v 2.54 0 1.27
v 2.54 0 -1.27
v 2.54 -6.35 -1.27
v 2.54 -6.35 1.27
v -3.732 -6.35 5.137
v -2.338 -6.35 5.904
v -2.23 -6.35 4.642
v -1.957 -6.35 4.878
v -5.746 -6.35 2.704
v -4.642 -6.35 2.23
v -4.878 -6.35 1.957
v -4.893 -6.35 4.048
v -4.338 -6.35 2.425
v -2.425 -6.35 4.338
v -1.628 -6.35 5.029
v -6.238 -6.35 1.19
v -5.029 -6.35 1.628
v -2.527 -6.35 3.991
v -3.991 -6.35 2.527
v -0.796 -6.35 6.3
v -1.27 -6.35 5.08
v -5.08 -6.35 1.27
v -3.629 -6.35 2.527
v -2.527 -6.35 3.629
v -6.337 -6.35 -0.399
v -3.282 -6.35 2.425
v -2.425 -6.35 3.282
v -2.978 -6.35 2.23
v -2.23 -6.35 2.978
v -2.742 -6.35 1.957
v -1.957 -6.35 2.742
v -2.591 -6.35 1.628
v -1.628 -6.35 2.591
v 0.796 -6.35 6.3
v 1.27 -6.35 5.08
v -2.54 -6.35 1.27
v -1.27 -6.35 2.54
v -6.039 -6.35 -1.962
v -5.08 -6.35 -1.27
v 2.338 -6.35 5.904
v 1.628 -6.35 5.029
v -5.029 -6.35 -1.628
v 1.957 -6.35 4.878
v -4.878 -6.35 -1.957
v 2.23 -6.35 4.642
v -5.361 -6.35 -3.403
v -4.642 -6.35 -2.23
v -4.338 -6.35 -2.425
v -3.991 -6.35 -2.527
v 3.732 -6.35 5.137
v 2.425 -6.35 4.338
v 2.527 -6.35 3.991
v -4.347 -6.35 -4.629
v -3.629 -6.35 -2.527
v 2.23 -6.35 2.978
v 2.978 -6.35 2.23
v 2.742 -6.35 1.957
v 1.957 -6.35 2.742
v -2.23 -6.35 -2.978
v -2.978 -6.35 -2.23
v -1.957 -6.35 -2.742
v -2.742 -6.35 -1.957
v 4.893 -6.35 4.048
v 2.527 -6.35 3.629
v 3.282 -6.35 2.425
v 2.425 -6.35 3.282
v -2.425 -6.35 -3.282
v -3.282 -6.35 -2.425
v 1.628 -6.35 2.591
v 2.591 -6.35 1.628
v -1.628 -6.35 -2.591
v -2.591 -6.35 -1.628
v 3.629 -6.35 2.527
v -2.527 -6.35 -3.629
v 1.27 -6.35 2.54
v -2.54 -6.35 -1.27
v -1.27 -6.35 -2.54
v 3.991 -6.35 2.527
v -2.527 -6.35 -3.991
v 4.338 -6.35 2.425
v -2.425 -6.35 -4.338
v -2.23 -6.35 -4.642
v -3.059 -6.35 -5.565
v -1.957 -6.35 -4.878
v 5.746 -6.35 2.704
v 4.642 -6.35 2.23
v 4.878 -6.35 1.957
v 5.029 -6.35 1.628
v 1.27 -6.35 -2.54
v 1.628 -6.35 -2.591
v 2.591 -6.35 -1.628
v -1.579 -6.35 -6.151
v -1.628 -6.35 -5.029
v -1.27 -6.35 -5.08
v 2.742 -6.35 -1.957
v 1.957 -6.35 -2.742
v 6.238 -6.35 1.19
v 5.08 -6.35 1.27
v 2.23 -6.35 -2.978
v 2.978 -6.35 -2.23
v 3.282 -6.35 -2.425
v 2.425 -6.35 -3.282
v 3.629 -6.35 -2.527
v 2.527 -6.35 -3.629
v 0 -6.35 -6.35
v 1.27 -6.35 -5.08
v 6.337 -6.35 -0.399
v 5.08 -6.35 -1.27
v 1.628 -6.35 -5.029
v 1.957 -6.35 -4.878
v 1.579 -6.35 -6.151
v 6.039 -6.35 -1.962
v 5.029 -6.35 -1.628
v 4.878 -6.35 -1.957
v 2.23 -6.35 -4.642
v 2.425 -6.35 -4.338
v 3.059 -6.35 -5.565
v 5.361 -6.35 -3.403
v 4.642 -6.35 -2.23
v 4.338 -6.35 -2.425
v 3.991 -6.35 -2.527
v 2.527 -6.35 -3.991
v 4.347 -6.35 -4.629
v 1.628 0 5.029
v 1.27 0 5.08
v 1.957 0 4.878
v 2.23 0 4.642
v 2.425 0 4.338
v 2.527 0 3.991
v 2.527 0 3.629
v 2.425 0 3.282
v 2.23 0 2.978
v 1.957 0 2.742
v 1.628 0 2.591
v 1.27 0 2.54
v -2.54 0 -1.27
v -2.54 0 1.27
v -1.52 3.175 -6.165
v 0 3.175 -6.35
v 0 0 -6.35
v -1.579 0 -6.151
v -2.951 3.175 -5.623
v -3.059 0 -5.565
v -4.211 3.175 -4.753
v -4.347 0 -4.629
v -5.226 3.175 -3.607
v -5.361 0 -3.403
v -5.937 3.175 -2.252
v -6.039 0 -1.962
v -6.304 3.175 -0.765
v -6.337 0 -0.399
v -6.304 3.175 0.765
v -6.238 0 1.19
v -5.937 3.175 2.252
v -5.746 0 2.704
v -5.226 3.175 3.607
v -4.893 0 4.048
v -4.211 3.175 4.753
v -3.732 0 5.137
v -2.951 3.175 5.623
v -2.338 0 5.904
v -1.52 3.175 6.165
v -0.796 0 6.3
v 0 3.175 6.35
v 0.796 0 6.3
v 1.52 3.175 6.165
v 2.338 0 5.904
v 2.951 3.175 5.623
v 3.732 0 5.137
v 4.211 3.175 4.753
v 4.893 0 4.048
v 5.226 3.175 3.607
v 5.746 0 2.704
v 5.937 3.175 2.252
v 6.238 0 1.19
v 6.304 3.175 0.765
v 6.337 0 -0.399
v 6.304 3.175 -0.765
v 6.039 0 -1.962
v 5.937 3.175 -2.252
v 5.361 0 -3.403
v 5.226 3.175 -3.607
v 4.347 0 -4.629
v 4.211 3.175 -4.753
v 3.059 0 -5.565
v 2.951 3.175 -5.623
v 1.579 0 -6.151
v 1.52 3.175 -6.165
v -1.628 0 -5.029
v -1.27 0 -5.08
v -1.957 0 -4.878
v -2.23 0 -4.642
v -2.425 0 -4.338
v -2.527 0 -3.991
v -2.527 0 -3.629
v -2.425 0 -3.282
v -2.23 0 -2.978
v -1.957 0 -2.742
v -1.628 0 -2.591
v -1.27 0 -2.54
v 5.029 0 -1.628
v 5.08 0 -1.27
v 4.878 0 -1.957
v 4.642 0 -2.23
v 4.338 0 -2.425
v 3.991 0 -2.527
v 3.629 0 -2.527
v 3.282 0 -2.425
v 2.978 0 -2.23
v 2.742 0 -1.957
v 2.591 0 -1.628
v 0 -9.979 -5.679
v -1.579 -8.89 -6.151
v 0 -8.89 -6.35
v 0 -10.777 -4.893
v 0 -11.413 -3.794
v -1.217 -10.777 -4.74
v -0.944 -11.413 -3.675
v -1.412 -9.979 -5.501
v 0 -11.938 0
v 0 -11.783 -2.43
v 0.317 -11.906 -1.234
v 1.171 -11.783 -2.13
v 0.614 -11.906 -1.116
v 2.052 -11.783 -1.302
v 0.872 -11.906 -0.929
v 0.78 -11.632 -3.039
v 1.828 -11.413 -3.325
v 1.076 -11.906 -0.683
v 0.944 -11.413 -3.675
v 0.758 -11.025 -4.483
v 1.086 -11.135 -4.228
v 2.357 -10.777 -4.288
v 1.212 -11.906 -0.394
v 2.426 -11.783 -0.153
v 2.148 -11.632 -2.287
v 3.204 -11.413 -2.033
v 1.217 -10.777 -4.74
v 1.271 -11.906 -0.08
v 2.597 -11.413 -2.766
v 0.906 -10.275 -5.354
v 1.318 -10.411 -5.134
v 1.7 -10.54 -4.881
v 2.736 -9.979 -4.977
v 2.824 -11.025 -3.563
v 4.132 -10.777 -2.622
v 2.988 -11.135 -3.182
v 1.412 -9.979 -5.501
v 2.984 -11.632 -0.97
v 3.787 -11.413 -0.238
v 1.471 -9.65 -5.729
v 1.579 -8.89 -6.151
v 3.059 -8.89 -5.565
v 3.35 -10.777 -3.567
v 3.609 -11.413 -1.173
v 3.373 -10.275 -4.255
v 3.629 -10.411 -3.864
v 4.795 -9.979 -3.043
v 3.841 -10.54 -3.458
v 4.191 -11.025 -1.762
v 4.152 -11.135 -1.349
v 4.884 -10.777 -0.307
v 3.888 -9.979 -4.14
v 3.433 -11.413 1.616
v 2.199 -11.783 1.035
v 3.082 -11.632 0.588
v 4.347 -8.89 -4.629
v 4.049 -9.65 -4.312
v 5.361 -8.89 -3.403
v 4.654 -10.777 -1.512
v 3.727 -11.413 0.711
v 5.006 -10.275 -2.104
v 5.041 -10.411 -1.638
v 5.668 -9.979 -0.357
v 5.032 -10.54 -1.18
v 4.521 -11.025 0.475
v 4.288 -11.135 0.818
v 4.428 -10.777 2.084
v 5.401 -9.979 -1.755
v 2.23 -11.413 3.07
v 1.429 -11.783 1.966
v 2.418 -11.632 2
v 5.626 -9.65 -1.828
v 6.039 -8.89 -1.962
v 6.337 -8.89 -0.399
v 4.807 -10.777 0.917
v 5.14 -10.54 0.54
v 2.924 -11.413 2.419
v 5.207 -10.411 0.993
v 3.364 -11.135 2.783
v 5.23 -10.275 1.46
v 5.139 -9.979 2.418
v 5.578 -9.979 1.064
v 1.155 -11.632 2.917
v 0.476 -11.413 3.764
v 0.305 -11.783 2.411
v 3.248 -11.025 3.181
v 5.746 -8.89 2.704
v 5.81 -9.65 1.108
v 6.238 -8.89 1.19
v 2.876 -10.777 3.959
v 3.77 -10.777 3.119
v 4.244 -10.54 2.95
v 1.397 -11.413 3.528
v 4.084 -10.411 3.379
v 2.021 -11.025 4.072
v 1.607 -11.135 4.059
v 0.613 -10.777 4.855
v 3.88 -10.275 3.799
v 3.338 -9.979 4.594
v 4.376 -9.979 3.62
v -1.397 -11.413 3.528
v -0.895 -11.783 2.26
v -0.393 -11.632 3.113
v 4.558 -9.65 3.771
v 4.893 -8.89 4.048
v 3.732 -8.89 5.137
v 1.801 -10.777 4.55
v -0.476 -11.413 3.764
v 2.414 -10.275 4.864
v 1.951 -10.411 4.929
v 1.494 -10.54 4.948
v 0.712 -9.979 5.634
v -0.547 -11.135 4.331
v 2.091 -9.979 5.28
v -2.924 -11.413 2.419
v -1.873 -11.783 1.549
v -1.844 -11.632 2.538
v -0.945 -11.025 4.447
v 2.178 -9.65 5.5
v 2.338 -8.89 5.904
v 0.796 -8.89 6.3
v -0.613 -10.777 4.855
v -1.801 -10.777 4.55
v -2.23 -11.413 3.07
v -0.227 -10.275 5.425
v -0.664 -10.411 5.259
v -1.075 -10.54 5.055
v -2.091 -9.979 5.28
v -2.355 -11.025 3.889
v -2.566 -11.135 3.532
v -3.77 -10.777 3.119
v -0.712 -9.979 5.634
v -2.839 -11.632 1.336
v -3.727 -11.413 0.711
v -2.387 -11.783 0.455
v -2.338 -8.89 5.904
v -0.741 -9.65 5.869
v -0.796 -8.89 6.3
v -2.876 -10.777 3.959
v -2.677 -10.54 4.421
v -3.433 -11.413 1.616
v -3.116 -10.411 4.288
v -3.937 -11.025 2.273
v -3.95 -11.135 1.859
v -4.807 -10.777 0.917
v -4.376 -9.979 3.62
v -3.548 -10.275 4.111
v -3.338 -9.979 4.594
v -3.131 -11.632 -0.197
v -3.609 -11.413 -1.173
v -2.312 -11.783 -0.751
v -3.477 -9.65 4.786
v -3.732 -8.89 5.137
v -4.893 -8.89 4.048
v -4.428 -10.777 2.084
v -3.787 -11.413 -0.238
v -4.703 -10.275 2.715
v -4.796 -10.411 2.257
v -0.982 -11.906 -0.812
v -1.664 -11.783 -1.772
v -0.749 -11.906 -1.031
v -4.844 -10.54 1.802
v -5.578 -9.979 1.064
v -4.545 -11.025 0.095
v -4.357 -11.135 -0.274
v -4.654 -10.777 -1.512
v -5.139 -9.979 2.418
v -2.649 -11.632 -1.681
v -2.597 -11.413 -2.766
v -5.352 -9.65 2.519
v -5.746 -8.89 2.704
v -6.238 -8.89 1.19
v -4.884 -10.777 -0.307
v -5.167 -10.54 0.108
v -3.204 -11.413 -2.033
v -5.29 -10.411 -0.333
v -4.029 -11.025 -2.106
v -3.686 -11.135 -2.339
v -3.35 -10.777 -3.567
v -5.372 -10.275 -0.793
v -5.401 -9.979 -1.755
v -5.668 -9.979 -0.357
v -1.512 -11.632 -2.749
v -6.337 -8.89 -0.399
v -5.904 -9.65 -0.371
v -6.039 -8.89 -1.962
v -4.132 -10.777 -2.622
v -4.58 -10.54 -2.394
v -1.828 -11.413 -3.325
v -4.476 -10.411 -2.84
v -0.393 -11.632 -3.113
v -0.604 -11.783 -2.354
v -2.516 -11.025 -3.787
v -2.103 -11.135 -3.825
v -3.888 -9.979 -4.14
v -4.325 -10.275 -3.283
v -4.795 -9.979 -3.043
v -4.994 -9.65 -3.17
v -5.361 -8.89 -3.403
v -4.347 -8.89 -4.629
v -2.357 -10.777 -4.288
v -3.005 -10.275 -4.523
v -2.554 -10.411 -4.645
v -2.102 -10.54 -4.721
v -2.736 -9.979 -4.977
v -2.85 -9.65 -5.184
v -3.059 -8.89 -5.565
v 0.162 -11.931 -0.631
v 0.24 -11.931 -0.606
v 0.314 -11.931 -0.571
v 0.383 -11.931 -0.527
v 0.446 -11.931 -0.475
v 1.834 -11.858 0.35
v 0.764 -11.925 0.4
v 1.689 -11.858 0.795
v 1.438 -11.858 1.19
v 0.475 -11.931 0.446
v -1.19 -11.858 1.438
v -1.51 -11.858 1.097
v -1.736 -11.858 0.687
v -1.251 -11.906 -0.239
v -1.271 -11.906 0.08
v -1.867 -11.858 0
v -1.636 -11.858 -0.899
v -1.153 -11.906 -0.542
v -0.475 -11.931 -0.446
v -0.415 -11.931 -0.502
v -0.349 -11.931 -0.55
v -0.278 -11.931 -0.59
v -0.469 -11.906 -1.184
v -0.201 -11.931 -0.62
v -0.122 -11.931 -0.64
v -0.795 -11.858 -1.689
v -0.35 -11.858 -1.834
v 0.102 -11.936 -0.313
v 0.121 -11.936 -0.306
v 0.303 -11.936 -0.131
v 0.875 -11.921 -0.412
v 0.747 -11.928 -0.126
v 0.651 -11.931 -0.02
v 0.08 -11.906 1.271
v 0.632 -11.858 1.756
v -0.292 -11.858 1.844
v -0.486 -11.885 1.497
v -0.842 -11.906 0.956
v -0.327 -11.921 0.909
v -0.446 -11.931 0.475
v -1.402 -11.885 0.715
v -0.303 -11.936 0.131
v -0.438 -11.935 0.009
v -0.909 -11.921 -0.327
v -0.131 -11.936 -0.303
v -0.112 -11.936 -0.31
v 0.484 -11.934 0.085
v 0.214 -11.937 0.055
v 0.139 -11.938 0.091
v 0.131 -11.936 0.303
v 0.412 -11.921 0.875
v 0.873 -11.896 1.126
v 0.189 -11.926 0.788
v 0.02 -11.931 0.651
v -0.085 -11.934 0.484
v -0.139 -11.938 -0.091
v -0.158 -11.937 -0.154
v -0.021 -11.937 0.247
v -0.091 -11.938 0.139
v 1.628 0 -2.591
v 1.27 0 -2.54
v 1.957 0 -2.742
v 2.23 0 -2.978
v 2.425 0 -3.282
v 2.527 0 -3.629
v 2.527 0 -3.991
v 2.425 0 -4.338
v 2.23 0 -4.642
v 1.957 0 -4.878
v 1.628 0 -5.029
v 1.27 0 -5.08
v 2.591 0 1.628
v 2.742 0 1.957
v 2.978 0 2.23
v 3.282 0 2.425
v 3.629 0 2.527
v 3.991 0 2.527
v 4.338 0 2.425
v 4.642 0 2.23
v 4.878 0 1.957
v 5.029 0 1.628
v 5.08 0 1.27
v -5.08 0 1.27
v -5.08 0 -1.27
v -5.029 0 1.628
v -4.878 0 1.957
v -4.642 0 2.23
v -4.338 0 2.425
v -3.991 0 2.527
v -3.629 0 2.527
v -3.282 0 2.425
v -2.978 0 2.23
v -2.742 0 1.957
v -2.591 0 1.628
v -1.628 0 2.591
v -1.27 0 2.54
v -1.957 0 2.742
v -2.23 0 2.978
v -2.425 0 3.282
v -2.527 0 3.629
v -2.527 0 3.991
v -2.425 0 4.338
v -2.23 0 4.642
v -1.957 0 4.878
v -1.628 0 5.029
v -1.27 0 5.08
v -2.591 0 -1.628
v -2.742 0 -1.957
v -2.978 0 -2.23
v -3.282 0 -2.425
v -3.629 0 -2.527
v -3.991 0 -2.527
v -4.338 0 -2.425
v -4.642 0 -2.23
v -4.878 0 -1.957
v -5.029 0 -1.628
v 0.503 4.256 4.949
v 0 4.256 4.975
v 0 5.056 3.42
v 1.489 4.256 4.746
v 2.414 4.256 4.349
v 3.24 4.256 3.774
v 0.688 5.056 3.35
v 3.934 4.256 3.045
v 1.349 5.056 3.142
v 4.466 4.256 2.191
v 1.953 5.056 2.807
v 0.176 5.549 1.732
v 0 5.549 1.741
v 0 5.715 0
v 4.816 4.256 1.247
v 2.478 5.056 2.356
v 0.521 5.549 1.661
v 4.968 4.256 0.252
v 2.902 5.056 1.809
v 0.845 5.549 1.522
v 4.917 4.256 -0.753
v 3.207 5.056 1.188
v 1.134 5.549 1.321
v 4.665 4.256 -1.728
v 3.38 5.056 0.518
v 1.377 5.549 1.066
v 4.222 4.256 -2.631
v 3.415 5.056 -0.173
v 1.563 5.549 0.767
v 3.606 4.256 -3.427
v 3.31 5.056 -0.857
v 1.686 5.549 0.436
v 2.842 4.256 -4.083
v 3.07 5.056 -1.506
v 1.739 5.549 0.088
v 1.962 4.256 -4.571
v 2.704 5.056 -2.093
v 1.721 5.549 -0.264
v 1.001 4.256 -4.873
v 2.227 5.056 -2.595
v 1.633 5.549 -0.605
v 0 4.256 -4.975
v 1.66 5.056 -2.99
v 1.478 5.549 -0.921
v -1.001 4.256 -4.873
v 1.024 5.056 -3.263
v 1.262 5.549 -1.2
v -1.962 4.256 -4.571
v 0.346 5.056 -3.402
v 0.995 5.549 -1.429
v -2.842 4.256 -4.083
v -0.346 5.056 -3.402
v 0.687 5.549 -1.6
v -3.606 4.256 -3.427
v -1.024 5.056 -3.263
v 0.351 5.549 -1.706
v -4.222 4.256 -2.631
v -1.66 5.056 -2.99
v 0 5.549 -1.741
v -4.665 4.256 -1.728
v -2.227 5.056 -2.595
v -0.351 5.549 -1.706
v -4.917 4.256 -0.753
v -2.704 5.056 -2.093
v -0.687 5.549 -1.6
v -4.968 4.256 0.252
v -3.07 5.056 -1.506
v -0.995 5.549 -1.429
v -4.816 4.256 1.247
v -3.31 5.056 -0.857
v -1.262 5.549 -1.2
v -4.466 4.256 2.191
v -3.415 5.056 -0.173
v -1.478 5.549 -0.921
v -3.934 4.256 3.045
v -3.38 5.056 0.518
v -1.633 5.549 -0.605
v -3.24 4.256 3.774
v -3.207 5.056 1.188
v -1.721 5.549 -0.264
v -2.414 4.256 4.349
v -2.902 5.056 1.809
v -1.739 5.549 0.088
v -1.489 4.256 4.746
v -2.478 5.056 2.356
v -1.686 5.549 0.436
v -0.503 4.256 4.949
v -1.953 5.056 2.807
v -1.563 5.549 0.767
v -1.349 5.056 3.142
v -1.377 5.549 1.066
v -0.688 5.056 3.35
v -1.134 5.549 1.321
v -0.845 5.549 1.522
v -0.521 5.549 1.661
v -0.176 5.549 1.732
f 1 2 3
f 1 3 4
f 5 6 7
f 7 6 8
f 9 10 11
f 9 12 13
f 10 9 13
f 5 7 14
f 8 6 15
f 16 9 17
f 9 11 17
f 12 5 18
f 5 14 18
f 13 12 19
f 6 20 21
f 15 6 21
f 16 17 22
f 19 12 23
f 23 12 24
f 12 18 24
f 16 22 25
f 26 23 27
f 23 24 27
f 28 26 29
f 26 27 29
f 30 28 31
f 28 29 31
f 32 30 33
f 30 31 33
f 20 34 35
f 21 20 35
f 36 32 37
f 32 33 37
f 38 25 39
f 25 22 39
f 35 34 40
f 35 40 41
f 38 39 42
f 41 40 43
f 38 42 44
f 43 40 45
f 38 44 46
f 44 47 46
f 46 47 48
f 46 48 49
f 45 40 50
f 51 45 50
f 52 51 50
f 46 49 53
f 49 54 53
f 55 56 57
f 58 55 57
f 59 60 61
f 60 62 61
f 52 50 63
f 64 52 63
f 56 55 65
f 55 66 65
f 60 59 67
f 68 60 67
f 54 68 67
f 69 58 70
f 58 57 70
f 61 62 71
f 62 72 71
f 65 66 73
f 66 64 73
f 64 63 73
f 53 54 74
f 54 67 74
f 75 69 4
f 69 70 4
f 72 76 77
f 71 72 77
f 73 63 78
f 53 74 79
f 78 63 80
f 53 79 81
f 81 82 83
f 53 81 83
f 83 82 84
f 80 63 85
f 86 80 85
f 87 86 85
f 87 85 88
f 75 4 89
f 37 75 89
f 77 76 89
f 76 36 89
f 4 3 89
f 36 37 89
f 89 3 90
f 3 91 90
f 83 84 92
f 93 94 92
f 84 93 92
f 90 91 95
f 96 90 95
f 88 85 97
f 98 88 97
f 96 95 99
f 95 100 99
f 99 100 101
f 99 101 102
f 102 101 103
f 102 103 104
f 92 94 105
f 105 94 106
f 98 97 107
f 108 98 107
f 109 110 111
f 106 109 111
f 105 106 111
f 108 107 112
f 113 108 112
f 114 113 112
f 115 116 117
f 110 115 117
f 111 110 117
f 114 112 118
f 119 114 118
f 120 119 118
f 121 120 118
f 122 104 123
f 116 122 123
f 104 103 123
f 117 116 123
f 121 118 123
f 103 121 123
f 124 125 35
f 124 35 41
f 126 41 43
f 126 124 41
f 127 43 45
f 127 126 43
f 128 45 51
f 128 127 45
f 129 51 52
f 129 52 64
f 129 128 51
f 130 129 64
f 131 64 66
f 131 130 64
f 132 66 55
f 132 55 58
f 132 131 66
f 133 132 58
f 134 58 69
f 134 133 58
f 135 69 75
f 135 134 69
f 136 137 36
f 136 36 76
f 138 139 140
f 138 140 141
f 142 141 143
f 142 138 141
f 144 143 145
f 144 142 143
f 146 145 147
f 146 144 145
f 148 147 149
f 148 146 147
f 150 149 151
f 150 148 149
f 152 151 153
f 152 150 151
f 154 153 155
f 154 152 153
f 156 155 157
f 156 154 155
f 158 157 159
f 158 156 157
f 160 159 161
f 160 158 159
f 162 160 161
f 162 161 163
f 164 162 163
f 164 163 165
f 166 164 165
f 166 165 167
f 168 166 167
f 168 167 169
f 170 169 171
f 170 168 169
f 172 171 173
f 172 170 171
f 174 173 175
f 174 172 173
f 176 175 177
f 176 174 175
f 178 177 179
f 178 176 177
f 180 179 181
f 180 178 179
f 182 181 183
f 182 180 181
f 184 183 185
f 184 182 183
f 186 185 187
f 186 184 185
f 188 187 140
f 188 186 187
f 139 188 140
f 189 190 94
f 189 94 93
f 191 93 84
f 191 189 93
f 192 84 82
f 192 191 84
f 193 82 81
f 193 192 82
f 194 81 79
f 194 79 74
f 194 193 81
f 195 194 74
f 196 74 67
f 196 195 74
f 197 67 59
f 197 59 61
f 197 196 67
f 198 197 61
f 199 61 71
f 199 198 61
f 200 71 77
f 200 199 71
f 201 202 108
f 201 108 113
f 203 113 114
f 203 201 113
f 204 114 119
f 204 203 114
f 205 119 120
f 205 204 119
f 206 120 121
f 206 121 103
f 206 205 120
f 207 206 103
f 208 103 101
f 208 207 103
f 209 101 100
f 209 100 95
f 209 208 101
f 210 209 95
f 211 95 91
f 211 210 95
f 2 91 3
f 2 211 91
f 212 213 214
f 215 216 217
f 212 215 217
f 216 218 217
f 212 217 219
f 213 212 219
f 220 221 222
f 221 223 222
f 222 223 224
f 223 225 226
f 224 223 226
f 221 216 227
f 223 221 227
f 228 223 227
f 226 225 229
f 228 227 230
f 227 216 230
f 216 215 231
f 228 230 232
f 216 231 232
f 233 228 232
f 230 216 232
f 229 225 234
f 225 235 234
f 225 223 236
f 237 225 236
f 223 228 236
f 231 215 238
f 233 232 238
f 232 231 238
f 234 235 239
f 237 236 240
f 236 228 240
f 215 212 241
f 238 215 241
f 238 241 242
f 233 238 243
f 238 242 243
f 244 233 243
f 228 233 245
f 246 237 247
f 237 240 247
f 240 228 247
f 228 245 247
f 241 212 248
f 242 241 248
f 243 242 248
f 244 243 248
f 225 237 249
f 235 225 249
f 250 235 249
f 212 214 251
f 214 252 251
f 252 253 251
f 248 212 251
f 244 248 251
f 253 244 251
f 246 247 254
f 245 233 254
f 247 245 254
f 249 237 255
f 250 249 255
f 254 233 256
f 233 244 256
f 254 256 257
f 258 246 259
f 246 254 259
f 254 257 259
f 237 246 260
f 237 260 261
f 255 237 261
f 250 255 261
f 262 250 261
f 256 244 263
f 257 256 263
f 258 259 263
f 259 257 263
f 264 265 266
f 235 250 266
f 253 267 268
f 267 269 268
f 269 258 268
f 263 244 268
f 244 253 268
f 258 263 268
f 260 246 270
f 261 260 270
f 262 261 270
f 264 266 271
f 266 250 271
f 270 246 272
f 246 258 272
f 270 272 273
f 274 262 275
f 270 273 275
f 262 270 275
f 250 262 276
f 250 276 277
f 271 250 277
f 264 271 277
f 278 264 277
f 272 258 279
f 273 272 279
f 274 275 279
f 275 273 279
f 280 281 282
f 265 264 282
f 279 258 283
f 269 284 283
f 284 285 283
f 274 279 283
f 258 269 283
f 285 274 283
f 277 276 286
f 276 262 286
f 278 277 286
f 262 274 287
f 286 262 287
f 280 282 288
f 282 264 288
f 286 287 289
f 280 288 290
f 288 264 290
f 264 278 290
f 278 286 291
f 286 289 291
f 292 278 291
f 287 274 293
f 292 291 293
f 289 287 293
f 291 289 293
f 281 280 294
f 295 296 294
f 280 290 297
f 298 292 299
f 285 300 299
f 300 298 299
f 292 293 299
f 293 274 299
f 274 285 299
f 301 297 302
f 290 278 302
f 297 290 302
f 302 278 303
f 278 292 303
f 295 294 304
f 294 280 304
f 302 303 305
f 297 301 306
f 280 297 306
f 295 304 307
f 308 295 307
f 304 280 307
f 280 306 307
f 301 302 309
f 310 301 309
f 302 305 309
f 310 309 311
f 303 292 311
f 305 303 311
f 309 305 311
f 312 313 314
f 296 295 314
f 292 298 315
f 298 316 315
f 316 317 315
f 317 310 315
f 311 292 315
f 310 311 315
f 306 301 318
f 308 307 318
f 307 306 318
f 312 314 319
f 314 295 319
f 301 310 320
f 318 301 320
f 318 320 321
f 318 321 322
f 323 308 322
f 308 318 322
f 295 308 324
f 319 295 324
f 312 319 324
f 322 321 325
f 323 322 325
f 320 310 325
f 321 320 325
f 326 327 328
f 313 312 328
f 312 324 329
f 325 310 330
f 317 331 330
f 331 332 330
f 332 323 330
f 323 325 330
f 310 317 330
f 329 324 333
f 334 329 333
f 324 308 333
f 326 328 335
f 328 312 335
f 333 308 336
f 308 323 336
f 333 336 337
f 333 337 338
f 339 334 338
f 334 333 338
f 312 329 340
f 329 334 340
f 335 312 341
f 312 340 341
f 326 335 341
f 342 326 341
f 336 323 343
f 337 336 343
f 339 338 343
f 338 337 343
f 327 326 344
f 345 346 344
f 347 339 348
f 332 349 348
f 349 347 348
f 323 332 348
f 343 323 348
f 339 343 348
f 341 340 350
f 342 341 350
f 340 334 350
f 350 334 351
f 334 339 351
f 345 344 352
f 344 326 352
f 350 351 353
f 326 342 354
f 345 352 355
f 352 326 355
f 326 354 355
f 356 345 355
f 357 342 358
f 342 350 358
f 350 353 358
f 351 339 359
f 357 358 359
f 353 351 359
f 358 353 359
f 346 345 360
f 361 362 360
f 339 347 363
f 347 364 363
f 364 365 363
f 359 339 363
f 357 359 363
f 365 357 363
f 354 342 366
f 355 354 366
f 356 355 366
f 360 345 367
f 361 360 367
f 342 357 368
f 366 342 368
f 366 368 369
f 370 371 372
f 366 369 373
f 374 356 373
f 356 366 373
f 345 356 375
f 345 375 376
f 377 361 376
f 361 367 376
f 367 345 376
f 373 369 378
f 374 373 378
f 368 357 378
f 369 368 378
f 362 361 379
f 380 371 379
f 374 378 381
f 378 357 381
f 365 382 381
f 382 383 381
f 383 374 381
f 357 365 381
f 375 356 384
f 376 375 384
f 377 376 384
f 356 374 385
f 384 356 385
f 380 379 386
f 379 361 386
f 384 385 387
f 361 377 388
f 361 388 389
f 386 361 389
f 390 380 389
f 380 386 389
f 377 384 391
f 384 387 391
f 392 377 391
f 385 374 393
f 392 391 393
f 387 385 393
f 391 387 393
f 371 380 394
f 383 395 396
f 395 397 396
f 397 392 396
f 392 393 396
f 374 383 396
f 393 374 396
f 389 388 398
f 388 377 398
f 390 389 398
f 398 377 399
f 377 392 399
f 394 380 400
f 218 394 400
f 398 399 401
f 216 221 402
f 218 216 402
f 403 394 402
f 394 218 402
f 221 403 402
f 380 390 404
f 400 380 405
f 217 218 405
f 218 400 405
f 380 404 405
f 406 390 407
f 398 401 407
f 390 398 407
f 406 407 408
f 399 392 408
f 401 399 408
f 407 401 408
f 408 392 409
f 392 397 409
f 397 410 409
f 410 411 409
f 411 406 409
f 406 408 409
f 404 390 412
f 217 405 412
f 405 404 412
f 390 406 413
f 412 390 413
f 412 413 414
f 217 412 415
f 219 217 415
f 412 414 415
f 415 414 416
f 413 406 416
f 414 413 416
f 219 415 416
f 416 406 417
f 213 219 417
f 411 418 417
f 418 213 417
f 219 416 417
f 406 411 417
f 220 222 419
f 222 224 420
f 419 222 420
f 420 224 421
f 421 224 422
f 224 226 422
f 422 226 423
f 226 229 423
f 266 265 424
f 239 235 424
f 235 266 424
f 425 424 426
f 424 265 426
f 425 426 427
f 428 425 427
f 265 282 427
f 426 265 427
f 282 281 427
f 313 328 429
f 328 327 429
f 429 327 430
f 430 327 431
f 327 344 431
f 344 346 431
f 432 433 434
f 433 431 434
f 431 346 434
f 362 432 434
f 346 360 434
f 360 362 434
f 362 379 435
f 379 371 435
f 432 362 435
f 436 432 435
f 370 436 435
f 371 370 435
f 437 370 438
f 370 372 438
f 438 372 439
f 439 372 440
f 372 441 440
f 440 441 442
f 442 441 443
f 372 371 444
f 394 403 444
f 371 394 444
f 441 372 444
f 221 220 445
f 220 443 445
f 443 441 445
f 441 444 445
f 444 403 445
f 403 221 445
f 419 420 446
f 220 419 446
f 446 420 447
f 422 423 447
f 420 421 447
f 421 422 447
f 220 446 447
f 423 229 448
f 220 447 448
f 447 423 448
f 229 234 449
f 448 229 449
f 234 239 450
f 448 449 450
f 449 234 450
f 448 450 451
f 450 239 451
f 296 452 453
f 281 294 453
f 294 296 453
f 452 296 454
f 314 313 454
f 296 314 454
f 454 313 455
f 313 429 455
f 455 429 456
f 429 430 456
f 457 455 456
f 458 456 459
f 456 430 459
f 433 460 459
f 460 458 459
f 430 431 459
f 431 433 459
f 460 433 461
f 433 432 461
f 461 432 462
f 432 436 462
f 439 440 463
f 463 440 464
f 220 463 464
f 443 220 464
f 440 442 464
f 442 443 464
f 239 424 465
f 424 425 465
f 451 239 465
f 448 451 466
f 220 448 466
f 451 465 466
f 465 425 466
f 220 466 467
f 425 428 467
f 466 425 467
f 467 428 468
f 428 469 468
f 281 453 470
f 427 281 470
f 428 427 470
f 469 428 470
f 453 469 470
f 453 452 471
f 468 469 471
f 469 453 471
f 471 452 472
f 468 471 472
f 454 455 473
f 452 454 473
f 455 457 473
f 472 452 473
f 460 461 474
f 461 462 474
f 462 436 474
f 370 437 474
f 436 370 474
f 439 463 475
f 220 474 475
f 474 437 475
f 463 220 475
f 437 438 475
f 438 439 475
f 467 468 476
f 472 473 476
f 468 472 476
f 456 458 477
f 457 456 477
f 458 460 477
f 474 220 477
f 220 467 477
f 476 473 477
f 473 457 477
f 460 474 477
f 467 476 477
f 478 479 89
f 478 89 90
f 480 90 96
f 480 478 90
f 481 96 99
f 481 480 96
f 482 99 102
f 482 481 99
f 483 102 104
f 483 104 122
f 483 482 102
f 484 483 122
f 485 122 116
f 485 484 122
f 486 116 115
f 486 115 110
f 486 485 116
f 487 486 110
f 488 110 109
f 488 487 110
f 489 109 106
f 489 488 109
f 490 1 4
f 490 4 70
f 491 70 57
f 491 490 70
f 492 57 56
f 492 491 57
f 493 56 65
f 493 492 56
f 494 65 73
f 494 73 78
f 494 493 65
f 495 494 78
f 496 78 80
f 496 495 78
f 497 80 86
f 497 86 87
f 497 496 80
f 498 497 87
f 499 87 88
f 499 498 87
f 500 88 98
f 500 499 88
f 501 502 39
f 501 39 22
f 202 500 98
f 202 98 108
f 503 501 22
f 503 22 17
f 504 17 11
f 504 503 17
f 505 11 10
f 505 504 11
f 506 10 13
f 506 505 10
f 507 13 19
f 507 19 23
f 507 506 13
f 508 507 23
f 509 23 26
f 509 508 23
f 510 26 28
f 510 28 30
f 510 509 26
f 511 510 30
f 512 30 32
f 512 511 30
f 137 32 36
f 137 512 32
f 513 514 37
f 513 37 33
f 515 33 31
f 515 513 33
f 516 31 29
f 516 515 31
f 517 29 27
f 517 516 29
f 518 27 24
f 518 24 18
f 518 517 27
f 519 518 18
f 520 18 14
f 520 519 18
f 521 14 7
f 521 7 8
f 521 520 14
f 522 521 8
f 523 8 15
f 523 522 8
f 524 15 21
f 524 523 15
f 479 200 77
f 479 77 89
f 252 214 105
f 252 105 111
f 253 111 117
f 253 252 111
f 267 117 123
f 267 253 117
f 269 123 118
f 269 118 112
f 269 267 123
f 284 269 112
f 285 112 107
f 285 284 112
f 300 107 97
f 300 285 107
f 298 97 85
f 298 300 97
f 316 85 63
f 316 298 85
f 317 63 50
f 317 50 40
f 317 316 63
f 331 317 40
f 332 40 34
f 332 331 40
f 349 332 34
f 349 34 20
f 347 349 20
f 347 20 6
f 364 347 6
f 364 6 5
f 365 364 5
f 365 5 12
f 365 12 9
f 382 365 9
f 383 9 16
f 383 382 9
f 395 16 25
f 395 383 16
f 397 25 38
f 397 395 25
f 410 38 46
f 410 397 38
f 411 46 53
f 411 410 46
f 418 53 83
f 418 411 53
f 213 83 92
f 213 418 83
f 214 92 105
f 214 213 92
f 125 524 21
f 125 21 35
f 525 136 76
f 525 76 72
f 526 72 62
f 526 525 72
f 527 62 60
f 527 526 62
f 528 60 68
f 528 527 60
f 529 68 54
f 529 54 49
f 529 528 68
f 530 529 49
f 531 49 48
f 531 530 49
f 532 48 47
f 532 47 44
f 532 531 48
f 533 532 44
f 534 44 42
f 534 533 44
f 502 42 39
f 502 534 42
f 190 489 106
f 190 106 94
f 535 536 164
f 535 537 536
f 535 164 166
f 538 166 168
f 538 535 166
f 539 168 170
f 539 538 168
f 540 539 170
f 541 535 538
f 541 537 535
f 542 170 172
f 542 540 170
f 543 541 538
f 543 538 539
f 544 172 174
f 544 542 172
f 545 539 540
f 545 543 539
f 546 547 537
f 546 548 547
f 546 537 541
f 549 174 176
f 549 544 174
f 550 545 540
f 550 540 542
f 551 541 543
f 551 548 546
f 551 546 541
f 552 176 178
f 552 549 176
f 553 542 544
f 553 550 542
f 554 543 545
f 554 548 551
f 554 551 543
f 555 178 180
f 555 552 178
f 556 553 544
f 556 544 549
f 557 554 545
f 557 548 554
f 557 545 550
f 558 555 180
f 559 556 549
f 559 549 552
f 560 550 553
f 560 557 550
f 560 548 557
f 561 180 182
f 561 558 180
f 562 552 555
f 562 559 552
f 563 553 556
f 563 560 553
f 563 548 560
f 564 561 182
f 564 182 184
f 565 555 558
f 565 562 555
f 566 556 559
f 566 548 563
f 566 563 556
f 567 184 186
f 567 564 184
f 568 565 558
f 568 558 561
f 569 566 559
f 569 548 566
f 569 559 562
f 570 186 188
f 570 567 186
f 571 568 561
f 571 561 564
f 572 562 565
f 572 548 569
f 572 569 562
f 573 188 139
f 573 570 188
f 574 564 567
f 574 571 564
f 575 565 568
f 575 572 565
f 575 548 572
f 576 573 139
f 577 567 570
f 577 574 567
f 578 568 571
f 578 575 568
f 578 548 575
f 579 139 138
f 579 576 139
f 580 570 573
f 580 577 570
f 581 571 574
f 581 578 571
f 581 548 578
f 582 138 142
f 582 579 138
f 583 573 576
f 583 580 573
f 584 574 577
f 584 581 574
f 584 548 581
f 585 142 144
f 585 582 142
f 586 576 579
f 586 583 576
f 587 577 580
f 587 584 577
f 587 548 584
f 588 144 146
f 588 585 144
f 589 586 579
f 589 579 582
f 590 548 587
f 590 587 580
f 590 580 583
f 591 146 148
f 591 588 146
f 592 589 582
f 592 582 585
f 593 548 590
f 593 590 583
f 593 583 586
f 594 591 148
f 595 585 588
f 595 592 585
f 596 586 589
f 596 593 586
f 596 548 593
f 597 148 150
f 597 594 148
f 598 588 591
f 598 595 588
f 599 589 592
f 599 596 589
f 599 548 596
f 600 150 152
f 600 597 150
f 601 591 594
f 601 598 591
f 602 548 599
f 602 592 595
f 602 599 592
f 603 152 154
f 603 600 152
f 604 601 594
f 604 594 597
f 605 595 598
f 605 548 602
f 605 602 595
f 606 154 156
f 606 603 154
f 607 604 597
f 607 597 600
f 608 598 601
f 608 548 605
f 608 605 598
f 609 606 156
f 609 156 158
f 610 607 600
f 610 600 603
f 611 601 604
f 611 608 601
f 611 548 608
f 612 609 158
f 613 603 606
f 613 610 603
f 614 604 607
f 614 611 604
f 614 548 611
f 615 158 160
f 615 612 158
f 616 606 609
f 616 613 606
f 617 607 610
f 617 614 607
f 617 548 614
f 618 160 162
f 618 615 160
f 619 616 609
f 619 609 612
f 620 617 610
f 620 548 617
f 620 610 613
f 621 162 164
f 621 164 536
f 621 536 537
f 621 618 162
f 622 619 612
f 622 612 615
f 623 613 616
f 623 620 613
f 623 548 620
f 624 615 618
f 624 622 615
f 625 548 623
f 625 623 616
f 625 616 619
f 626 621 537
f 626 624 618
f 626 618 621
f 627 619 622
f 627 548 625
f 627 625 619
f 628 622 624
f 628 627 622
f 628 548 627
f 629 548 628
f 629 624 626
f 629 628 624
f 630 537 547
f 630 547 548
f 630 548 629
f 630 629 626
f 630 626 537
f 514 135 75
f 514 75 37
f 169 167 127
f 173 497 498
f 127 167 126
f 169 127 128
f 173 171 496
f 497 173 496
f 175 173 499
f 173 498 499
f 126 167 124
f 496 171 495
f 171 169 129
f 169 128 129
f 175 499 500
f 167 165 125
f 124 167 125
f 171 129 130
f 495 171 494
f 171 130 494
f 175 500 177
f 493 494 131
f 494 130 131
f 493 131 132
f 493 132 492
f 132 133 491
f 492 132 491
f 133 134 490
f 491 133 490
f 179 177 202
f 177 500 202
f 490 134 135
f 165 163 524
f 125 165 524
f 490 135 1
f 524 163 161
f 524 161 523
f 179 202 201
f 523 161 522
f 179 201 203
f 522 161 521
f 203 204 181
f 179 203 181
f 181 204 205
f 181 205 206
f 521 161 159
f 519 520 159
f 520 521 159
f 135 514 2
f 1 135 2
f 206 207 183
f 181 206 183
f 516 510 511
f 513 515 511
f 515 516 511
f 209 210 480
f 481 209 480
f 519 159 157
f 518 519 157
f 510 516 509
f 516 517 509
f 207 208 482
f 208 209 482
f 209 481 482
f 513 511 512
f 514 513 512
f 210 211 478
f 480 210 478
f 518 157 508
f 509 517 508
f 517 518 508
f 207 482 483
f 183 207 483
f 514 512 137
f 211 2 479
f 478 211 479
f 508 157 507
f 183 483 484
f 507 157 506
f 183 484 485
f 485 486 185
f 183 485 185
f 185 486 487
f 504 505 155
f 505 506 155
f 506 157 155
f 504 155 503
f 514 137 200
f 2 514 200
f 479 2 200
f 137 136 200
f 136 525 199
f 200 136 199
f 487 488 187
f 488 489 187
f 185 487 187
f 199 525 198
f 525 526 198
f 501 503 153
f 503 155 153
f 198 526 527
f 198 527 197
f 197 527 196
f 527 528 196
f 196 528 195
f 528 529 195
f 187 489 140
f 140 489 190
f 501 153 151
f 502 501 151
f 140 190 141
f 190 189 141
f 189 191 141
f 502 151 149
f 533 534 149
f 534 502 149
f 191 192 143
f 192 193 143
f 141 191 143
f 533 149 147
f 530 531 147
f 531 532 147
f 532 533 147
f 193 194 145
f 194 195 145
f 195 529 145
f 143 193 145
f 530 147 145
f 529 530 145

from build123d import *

# Parameters (mm, degrees)
SKETCH1_W             = 6.35
SKETCH1_H             = 3.175
DOMEY_TOP_FACE_RADIUS = 6.35
DOMEY_TOP_HEIGHT      = 2.54
ONE_LEG_DEPTH         = 6.35
ALL_LEGS_COUNT        = 4
BASE_START            = 2.54
SKETCH3_R             = 6.35
BASE_DEPTH            = 2.54


with BuildPart() as part:
    # Sketch1 → button top (revolve)
    with BuildSketch(Plane.XY, mode=Mode.PRIVATE) as button_top_sk:
        with Locations((-3.175, 1.5875)):
            Rectangle(SKETCH1_W, SKETCH1_H)
    revolve(button_top_sk.sketch.rotate(Axis((0, 0, 0), (0, 1, 0)), 270), axis=Axis((0, 0, 0), (0, 1, 0)))

    # domey top: a dome of height H over a round flat face of radius A is a cap of a sphere of radius (A * A + H * H) / (2 * H)
    domey_top_r = (DOMEY_TOP_FACE_RADIUS * DOMEY_TOP_FACE_RADIUS + DOMEY_TOP_HEIGHT * DOMEY_TOP_HEIGHT) / (2 * DOMEY_TOP_HEIGHT)
    domey_top_base = Plane((0, 3.175, 0), z_dir=(0, 1, 0))
    with Locations(domey_top_base.offset(DOMEY_TOP_HEIGHT - domey_top_r)):
        domey_top_ball = Sphere(domey_top_r, mode=Mode.PRIVATE)
    add(split(domey_top_ball, bisect_by=domey_top_base, keep=Keep.TOP, mode=Mode.PRIVATE))

    # Sketch2 → one leg (add)
    with BuildSketch(Plane.XZ):
        with BuildLine():
            Line((-1.27, -2.54), (1.27, -2.54))
            ThreePointArc((1.27, -2.54), (2.54, -3.81), (1.27, -5.08))
            Line((1.27, -5.08), (-1.27, -5.08))
            ThreePointArc((-1.27, -5.08), (-2.54, -3.81), (-1.27, -2.54))
        make_face()
    one_leg = extrude(amount=ONE_LEG_DEPTH)

    # all legs: one leg ×4 about axis
    all_legs_axis = Axis((0, 0, 0), (0, 1, 0))
    for i in range(1, ALL_LEGS_COUNT):
        add(one_leg.rotate(all_legs_axis, i * 360 / ALL_LEGS_COUNT))

    # Sketch3 → base (add)
    with BuildSketch(Plane.XZ.offset(6.35).offset(BASE_START)):
        with Locations(Location((0, 0, 0), (0, 0, 270))):
            Circle(SKETCH3_R)
    extrude(amount=-BASE_DEPTH)

    # Sketch6 → Revolve2 (revolve)
    with BuildSketch(Plane(origin=(0, 0, 0), x_dir=(0, 0, -1), z_dir=(1, 0, 0))):
        with BuildLine():
            Line((0, -8.89), (0, -11.938))
            add(Edge.make_bspline(
                [(0, -11.938), (2.963289741, -11.938), (5.038193669, -11.554158935), (6.35, -8.89)],
                knots=[0, 0, 0, 0, 1, 1, 1, 1], degree=3))
            Line((6.35, -8.89), (0, -8.89))
        make_face()
    revolve(axis=Axis((0, -8.89, 0), (0, -1, 0)))


solid = part.part
